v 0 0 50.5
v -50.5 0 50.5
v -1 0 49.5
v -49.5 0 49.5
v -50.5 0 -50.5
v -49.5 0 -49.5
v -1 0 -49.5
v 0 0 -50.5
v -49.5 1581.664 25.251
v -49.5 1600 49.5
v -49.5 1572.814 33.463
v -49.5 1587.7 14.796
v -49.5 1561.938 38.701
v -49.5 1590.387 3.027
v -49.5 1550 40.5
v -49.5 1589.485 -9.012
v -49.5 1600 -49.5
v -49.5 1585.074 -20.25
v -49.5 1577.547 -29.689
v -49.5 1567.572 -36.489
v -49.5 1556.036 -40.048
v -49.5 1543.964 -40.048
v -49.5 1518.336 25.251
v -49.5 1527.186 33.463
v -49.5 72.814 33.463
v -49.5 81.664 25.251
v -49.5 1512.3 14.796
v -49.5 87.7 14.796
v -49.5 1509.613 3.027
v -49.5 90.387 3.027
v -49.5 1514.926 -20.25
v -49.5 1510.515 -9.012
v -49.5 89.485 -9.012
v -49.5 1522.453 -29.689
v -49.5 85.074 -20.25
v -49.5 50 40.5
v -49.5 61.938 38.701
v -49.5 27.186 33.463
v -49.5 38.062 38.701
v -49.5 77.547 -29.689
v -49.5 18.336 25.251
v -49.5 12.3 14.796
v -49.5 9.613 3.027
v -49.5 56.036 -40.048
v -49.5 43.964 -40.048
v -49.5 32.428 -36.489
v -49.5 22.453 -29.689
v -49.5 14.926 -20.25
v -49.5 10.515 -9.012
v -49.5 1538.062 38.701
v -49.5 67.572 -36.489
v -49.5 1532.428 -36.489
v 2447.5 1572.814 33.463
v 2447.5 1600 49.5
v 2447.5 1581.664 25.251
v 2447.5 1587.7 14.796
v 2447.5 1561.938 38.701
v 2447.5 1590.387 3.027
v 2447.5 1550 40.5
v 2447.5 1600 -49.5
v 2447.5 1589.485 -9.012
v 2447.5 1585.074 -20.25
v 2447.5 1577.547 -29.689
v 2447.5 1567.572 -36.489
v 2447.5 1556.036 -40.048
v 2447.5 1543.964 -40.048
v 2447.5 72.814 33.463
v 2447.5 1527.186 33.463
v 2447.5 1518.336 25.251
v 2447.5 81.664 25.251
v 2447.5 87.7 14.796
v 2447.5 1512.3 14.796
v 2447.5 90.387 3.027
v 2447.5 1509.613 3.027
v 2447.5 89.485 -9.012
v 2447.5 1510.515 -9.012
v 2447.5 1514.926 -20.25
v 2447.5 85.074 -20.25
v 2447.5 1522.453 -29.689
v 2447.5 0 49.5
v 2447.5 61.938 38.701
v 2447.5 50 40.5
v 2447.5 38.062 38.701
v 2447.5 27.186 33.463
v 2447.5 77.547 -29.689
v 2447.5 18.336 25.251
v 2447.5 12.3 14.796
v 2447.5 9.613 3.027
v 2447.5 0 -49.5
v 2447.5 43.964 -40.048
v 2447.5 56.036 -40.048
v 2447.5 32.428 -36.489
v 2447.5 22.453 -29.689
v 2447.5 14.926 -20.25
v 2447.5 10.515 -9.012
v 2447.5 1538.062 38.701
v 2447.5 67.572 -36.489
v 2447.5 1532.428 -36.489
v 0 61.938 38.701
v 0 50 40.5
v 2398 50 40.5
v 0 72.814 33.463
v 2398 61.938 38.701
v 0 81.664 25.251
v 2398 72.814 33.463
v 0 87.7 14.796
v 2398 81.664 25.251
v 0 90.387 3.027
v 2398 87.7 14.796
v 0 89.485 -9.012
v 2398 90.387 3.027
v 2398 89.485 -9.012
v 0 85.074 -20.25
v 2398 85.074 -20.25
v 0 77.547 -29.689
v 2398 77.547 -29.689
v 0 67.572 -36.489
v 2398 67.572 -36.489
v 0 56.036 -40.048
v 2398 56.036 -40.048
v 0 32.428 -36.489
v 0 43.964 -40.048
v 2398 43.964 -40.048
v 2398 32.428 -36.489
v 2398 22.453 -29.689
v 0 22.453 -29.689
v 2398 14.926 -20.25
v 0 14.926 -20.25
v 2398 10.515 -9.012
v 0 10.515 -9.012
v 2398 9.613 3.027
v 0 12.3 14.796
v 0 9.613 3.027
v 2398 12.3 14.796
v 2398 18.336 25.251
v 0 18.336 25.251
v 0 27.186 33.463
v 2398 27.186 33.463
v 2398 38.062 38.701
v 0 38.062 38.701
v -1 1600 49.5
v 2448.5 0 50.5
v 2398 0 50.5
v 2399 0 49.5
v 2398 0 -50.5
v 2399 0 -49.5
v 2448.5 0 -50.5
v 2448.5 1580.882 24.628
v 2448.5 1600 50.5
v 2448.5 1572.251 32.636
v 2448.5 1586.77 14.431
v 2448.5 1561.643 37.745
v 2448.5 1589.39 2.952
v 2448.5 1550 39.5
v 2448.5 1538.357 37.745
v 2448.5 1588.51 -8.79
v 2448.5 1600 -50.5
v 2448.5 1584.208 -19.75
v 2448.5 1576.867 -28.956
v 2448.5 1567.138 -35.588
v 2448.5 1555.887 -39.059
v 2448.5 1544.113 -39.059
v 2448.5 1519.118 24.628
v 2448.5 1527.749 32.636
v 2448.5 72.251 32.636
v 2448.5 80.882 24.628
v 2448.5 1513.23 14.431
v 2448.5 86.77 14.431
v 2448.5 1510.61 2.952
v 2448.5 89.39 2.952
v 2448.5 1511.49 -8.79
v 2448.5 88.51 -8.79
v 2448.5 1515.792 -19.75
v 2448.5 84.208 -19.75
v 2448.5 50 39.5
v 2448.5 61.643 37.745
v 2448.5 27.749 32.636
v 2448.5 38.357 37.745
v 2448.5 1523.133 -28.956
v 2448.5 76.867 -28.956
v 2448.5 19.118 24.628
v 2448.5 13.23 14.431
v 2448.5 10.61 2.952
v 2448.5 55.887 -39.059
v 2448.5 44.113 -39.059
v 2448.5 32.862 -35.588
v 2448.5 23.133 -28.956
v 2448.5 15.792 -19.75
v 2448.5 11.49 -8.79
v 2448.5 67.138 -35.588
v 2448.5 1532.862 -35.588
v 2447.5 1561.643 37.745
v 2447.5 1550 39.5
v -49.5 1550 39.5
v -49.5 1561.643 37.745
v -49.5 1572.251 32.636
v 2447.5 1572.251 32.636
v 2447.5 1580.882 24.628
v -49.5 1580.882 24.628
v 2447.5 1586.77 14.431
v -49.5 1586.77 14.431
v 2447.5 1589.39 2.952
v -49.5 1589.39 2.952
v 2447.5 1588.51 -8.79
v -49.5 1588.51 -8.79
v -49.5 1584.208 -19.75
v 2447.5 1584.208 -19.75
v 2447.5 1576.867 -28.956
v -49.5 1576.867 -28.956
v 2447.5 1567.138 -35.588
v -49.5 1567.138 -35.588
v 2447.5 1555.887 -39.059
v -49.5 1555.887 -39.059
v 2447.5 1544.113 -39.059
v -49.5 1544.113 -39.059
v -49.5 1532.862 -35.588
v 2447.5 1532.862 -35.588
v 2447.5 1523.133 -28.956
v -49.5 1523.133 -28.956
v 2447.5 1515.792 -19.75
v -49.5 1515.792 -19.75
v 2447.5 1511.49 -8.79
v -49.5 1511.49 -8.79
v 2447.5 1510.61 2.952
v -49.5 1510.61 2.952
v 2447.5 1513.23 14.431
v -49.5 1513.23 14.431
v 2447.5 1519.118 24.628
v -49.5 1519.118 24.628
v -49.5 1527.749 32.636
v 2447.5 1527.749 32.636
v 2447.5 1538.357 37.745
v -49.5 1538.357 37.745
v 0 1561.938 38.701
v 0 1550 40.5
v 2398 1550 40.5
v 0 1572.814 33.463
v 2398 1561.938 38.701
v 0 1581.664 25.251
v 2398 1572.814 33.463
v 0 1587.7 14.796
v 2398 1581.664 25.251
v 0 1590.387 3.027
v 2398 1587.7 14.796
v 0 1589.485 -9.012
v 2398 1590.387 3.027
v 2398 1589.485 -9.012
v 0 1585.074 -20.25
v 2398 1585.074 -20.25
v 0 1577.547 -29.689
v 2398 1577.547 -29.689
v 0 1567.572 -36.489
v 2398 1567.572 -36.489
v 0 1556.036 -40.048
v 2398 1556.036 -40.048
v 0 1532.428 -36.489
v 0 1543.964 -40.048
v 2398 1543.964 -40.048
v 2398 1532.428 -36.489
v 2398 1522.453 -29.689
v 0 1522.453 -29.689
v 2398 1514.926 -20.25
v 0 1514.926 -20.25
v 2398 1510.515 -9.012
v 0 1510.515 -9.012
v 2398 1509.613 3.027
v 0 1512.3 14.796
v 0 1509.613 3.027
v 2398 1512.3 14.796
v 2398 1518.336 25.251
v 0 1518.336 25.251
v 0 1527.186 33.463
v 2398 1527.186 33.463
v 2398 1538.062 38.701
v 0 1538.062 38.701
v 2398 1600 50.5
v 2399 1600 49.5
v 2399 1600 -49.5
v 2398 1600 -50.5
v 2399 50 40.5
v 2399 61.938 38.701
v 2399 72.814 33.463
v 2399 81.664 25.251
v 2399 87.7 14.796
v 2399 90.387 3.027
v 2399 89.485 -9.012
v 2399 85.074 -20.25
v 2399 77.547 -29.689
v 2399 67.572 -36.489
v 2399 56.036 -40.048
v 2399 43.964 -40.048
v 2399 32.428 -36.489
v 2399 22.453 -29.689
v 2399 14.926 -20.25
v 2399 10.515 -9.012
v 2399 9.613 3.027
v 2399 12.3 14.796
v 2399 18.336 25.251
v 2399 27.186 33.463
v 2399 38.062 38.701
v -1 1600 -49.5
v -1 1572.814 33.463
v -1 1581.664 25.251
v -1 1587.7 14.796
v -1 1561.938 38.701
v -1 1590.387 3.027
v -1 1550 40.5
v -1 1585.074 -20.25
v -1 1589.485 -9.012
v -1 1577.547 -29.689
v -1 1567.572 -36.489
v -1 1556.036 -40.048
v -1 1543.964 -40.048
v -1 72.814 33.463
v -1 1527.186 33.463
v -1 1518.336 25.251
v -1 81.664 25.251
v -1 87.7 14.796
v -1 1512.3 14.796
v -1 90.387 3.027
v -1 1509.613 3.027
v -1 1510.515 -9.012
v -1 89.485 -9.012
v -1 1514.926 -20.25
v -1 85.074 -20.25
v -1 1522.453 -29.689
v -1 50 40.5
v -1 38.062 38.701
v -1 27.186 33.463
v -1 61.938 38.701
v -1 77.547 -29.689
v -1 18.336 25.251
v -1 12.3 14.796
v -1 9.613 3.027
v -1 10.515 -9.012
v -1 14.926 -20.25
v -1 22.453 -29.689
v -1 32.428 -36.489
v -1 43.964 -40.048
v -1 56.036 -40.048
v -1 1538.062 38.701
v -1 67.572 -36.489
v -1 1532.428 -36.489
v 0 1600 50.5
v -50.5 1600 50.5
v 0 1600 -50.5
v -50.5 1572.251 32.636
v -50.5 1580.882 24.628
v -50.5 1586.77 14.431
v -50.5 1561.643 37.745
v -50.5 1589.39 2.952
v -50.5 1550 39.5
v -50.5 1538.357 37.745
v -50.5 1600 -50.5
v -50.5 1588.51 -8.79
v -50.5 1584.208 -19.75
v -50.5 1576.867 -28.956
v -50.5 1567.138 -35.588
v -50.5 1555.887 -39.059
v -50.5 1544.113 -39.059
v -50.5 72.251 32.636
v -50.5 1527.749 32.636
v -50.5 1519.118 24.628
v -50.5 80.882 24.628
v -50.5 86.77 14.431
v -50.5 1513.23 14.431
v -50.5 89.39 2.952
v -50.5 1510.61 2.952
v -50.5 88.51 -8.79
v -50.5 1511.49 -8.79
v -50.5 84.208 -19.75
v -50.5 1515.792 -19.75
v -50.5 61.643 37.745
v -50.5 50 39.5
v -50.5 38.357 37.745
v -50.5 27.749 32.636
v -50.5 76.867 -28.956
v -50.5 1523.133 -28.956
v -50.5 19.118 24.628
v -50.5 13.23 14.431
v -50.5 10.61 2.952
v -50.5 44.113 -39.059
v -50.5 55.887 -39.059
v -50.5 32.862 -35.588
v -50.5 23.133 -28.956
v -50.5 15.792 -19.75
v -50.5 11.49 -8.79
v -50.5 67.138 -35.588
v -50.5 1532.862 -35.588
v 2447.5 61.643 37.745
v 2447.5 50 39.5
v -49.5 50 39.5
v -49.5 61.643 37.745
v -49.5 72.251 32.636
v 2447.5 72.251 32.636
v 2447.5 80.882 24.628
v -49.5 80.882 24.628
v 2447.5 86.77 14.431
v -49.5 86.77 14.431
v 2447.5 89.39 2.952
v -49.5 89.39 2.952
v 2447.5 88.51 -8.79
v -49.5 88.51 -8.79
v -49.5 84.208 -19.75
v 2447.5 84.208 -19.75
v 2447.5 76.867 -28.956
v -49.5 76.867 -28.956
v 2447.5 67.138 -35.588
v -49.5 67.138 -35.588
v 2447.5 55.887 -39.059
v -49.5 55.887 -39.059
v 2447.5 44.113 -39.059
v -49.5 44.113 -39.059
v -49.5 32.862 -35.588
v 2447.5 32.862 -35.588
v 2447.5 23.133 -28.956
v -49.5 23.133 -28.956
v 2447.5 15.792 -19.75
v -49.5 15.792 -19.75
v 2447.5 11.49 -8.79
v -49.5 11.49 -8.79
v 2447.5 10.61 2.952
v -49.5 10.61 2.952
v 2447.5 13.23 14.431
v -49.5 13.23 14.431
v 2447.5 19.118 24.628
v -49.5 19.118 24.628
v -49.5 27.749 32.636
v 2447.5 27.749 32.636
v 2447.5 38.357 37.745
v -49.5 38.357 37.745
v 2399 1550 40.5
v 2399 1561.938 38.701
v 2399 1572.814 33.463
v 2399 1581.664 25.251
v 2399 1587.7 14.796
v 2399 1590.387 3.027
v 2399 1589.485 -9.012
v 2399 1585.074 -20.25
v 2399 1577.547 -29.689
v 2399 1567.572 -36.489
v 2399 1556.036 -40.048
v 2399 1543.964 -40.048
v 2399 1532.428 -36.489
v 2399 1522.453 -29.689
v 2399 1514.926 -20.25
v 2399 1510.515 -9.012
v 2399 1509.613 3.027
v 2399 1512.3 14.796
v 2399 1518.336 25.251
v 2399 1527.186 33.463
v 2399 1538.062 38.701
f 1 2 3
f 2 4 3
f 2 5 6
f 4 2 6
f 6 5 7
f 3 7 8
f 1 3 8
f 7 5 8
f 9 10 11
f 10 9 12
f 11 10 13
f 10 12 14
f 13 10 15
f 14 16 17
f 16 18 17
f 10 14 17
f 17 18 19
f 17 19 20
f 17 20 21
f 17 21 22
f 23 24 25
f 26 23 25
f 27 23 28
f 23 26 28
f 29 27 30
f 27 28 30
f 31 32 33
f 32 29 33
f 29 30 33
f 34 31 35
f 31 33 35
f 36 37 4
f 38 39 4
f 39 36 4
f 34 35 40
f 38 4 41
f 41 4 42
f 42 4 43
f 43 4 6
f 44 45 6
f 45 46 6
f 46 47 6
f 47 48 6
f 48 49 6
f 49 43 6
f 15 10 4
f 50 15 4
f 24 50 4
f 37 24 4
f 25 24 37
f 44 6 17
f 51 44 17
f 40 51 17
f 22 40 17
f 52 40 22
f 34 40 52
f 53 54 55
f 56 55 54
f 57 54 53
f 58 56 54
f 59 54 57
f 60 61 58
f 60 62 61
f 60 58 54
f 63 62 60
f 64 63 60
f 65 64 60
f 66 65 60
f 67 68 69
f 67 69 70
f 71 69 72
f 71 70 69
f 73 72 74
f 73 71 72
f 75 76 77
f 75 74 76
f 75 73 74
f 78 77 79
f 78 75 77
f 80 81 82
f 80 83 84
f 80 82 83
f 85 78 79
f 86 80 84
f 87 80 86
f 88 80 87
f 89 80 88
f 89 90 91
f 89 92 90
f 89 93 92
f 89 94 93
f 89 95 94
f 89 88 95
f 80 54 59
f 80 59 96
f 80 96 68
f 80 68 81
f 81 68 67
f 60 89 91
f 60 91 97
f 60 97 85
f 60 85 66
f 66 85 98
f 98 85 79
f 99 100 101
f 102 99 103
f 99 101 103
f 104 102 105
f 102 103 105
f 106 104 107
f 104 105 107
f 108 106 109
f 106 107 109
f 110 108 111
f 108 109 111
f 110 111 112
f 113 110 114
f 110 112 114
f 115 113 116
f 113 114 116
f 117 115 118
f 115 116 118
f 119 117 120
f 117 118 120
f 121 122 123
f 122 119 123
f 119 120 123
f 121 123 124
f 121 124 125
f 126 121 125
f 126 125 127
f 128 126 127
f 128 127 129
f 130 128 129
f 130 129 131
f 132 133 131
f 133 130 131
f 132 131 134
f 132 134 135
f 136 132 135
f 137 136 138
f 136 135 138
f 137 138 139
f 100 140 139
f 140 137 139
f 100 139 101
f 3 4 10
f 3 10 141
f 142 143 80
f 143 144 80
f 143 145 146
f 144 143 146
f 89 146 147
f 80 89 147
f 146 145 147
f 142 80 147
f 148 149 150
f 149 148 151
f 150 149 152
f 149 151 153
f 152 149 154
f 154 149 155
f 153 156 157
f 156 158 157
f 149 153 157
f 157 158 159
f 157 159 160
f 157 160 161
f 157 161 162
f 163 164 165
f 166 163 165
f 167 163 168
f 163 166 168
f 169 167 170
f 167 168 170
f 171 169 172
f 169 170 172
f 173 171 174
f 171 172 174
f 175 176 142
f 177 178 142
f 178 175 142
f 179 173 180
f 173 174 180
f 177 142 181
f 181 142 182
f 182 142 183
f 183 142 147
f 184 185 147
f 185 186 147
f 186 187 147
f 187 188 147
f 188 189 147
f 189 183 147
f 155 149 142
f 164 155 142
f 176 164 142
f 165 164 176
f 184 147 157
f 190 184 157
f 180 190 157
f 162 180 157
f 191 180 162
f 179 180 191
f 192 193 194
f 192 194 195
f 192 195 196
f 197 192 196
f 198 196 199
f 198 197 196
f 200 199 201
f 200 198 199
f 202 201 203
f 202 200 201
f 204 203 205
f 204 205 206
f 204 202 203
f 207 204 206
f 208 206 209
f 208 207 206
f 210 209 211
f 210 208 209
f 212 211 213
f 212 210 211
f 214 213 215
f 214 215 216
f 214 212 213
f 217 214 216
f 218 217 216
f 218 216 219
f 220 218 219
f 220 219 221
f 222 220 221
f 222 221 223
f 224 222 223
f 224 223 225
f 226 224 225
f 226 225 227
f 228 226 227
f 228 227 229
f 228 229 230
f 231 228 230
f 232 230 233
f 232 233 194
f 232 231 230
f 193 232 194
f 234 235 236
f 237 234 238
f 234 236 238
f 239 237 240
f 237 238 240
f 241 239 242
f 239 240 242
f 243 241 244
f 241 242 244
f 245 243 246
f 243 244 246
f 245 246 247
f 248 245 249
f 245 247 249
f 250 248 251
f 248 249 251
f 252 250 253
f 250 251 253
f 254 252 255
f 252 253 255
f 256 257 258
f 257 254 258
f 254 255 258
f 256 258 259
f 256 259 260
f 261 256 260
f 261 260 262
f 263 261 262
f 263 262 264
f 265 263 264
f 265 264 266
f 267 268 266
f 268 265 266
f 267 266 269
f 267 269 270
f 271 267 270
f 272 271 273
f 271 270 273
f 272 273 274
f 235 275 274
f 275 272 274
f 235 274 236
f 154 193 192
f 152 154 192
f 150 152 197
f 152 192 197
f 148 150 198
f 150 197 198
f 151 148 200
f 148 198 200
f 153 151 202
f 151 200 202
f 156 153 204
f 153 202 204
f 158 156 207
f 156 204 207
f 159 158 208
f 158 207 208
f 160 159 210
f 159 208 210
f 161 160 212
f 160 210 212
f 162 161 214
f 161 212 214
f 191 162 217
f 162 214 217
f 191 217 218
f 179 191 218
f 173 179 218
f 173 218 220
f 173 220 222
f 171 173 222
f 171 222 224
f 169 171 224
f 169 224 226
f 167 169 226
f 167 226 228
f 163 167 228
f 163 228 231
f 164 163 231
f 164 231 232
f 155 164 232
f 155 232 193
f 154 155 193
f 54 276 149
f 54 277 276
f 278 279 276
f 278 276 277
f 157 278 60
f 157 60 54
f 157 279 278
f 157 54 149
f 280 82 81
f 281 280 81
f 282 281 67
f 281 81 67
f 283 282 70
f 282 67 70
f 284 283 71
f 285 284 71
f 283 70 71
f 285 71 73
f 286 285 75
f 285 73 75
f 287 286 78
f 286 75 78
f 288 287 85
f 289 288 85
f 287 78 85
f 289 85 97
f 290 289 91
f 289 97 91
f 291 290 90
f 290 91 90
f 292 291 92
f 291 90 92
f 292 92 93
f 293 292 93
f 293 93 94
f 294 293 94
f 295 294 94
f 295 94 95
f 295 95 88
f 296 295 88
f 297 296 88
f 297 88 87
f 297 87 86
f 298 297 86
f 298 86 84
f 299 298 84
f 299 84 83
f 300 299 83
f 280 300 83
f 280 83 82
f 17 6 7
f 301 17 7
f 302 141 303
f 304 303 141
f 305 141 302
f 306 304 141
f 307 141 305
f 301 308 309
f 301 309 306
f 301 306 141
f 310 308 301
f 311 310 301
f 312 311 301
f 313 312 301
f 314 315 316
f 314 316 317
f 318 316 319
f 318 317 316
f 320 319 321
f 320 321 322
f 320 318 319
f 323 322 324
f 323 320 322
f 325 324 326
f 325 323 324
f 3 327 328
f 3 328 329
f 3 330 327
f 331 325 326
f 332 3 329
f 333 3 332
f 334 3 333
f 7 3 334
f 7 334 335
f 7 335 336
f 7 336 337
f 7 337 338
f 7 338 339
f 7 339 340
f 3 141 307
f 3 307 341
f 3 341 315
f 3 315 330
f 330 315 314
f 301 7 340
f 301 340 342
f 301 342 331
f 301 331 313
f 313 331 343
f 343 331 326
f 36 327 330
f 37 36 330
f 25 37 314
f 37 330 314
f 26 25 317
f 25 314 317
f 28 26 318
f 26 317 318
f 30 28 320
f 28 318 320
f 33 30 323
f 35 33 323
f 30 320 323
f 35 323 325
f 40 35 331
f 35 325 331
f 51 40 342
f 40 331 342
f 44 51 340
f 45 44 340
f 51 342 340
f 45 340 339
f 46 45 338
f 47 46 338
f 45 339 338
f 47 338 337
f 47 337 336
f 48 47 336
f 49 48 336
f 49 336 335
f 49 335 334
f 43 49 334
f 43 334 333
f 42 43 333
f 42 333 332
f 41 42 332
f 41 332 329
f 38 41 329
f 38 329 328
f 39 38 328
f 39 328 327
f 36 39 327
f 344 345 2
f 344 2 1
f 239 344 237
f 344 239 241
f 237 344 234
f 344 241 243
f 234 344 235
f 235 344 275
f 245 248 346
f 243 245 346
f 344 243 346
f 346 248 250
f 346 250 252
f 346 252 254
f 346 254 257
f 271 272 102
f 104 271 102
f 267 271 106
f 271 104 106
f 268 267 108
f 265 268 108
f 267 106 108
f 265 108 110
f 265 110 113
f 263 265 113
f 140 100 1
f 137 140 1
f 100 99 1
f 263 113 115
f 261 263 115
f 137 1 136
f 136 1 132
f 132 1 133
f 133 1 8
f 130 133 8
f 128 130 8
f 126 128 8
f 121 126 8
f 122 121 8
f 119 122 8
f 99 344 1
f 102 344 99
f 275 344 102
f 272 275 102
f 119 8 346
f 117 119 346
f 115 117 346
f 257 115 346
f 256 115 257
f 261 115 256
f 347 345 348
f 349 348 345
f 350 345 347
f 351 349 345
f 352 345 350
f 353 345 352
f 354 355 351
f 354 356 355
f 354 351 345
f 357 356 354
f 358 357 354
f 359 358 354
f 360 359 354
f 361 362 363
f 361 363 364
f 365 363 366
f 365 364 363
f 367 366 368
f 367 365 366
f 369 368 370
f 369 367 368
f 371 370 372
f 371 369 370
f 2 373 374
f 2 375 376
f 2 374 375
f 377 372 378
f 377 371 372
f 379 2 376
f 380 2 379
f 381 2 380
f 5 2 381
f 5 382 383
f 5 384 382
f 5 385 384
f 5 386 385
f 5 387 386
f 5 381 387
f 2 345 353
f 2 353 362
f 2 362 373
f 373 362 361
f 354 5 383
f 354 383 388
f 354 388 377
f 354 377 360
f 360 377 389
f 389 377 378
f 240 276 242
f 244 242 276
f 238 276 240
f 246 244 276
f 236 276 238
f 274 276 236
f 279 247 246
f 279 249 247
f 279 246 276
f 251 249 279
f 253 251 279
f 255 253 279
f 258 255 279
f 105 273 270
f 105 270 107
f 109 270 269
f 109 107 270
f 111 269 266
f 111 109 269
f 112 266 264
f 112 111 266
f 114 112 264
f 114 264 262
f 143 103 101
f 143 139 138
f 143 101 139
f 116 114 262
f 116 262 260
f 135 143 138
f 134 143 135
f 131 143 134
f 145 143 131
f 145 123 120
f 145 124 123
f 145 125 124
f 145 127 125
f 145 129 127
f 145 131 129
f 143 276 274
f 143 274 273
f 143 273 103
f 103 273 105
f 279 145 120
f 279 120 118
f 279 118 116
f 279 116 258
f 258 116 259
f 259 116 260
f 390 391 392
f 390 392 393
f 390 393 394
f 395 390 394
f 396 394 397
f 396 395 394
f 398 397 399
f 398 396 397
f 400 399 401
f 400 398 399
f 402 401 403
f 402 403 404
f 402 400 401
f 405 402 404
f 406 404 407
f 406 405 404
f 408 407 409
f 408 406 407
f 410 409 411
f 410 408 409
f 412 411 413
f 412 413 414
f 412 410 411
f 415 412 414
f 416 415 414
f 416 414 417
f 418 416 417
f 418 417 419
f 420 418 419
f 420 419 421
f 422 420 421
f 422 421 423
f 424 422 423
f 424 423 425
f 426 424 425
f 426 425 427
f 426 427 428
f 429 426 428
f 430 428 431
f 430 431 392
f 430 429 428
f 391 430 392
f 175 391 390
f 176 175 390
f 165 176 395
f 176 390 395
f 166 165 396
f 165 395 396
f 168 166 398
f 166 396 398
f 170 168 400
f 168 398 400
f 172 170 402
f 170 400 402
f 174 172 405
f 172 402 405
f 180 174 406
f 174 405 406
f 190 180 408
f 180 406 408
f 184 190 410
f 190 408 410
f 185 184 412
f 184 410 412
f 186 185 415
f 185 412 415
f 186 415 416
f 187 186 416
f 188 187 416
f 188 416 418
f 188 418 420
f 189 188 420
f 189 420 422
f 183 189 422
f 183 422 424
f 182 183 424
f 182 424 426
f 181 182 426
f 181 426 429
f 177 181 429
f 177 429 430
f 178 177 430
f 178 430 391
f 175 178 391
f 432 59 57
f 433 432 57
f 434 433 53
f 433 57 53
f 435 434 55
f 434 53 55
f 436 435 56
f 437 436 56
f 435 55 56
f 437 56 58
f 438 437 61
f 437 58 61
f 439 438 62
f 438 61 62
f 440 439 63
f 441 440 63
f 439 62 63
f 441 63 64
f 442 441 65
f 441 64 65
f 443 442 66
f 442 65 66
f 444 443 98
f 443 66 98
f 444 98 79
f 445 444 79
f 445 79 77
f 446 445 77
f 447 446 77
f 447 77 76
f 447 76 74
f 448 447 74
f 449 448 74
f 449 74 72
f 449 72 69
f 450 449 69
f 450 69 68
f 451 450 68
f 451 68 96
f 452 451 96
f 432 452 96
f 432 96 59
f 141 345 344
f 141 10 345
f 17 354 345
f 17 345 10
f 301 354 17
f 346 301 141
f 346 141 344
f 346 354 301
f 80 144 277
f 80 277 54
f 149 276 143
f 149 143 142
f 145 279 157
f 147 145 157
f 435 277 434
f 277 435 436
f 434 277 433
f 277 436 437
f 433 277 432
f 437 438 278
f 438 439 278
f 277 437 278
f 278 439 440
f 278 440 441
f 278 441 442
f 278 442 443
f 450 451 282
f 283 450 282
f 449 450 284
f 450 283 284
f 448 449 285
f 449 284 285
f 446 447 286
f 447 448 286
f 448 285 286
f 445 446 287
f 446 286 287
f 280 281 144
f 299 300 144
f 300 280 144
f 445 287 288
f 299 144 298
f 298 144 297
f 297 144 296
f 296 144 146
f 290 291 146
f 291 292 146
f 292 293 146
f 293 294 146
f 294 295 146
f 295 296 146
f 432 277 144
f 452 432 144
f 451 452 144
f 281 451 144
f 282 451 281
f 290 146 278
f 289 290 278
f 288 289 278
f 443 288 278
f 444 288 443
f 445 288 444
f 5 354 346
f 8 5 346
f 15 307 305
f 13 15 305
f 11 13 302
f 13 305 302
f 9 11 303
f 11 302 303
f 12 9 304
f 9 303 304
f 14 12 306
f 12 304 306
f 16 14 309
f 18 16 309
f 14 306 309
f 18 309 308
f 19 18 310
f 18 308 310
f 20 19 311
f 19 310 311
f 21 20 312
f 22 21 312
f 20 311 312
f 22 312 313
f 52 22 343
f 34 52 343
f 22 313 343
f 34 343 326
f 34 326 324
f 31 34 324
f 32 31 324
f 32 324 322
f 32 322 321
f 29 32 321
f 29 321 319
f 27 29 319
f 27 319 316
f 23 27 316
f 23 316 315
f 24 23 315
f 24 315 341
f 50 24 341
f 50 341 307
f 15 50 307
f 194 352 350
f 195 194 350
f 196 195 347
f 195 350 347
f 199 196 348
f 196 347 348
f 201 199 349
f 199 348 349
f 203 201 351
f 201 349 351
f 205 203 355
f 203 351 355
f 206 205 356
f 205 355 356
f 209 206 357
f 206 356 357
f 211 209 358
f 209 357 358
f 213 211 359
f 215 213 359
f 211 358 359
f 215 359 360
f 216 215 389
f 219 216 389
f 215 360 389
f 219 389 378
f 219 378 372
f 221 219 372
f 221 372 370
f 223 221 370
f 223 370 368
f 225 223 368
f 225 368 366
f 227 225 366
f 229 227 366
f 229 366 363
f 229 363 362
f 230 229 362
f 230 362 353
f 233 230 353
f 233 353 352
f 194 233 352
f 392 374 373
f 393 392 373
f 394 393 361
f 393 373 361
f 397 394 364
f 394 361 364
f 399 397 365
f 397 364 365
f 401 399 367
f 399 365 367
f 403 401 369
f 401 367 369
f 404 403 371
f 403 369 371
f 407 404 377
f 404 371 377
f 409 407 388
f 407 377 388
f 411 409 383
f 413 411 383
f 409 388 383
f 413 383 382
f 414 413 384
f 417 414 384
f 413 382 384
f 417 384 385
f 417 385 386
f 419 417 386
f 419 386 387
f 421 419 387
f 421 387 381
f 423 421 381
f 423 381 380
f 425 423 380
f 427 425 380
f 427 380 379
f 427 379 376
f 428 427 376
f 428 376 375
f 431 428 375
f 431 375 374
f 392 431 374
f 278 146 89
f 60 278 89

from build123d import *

# Parameters (mm, degrees)
SKETCH3_W             = 50.5
SKETCH3_H             = 101
SKETCH3_W_2           = 48.5
SKETCH3_H_2           = 99
BOSS_EXTRUDE1_DEPTH   = 1600
BOSS_EXTRUDE1_2_DEPTH = 1600
SKETCH8_R             = 39.5
CUT_EXTRUDE1_DEPTH    = 2500
SKETCH9_R             = 40.5
CUT_EXTRUDE2_DEPTH    = 1
SKETCH10_R            = 40.5
CUT_EXTRUDE3_DEPTH    = 1
SKETCH13_R            = 40.5
SKETCH13_R_2          = 39.5
BOSS_EXTRUDE2_DEPTH   = 2497


with BuildPart() as part:
    # Sketch3 → Boss-Extrude1 (new body)
    with BuildSketch(Plane(origin=(0, 0, 0), x_dir=(1, 0, 0), z_dir=(0, 1, 0))):
        with Locations((-25.25, 0)):
            Rectangle(SKETCH3_W, SKETCH3_H)
        with Locations((-25.25, 0)):
            Rectangle(SKETCH3_W_2, SKETCH3_H_2, mode=Mode.SUBTRACT)
    extrude(amount=BOSS_EXTRUDE1_DEPTH)


with BuildPart() as body_2:
    # Sketch3 → Boss-Extrude1 2 (new body)
    with BuildSketch(Plane(origin=(0, 0, 0), x_dir=(1, 0, 0), z_dir=(0, 1, 0))):
        with Locations((2423.25, 0)):
            Rectangle(SKETCH3_W, SKETCH3_H)
        with Locations((2423.25, 0)):
            Rectangle(SKETCH3_W_2, SKETCH3_H_2, mode=Mode.SUBTRACT)
    extrude(amount=BOSS_EXTRUDE1_2_DEPTH)


with BuildPart() as cut_extrude1_tool:
    # Sketch8 → Cut-Extrude1 (new body, through all)
    with BuildSketch(Plane.ZY.offset(50.5)):
        with Locations((0, 50)):
            Circle(SKETCH8_R)
        with Locations((0, 1550)):
            Circle(SKETCH8_R)
    extrude(amount=-CUT_EXTRUDE1_DEPTH)


with BuildPart() as part_1:
    add(part.part)

    # Cut-Extrude1: cut by cut_extrude1_tool
    add(cut_extrude1_tool.part, mode=Mode.SUBTRACT)

    # Sketch9 → Cut-Extrude2 (cut)
    with BuildSketch(Plane(origin=(0, 0, 0), x_dir=(0, 0, -1), z_dir=(1, 0, 0))):
        with Locations((0, 50)):
            Circle(SKETCH9_R)
        with Locations((0, 1550)):
            Circle(SKETCH9_R)
    extrude(amount=-CUT_EXTRUDE2_DEPTH, mode=Mode.SUBTRACT)



with BuildPart() as body_2_1:
    add(body_2.part)

    # Cut-Extrude1: cut by cut_extrude1_tool
    add(cut_extrude1_tool.part, mode=Mode.SUBTRACT)

    # Sketch10 → Cut-Extrude3 (cut)
    with BuildSketch(Plane.ZY.offset(-2398)):
        with Locations((0, 50)):
            Circle(SKETCH10_R)
        with Locations((0, 1550)):
            Circle(SKETCH10_R)
    extrude(amount=-CUT_EXTRUDE3_DEPTH, mode=Mode.SUBTRACT)


with BuildPart() as part_2:
    add(part_1.part)

    add(body_2_1.part)  # Boss-Extrude2 merges body 2
    # Sketch13 → Boss-Extrude2 (add)
    with BuildSketch(Plane.ZY.offset(-2447.5)):
        with Locations((0, 50)):
            Circle(SKETCH13_R)
        with Locations((0, 50)):
            Circle(SKETCH13_R_2, mode=Mode.SUBTRACT)
        with Locations((0, 1550)):
            Circle(SKETCH13_R)
        with Locations((0, 1550)):
            Circle(SKETCH13_R_2, mode=Mode.SUBTRACT)
    extrude(amount=BOSS_EXTRUDE2_DEPTH)


solid = part_2.part
